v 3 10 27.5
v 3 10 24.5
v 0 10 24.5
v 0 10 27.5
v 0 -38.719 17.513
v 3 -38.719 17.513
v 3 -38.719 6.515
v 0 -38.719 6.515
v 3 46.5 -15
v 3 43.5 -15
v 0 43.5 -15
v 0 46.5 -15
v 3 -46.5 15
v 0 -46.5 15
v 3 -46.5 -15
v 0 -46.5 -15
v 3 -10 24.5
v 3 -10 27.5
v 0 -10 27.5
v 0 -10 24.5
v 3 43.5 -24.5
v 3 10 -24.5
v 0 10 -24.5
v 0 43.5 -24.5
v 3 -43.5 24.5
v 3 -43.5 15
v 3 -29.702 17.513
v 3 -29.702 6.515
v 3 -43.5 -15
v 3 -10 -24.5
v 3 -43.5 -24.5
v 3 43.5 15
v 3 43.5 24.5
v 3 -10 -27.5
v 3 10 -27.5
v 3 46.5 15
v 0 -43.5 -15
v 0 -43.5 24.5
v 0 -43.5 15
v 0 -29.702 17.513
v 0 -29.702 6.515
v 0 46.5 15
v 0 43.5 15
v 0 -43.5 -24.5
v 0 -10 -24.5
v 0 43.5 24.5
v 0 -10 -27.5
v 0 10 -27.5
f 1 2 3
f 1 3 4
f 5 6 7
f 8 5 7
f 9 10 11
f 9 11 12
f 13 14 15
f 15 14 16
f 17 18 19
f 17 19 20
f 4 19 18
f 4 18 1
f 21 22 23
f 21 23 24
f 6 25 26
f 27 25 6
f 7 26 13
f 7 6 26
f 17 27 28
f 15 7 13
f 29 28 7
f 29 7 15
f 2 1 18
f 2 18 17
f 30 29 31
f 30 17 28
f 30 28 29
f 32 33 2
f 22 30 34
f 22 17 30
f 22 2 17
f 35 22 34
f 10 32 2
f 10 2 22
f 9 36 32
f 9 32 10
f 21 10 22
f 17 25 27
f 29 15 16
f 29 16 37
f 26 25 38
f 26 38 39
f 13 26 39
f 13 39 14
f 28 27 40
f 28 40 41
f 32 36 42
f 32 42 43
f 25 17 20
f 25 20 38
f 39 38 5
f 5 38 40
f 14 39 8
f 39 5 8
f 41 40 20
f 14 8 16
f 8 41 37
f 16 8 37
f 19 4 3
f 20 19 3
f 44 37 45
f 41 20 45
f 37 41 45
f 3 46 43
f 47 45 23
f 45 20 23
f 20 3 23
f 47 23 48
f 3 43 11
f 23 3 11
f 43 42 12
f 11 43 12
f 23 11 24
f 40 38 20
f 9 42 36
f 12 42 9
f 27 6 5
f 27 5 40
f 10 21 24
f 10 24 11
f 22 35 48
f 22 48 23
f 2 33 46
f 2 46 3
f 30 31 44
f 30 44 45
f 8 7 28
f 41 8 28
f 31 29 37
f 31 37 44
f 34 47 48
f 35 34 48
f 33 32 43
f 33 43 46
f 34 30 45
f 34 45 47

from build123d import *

# Parameters (mm, degrees)
SKETCH2_W           = 55
SKETCH2_H           = 93
BOSS_EXTRUDE1_DEPTH = 3
SKETCH3_W           = 10.997747865
SKETCH3_H           = 9.016820523
CUT_EXTRUDE1_DEPTH  = 3


with BuildPart() as part:
    # Sketch2 → Boss-Extrude1 (new body)
    with BuildSketch(Plane(origin=(0, 0, 0), x_dir=(0, 0, -1), z_dir=(1, 0, 0))):
        Rectangle(SKETCH2_W, SKETCH2_H)
    extrude(amount=BOSS_EXTRUDE1_DEPTH)

    # Sketch3 → Cut-Extrude1 (cut)
    with BuildSketch(Plane(origin=(3, 0, 0), x_dir=(0, 0, -1), z_dir=(1, 0, 0))):
        Polygon((-27.5, 46.5), (-24.5, 46.5), (-15, 46.5), (-15, 43.5), (-24.5, 43.5), (-24.5, 10), (-27.5, 10), align=None)
        Polygon((27.5, 46.5), (27.5, 10), (24.5, 10), (24.5, 43.5), (15, 43.5), (15, 46.5), (24.5, 46.5), align=None)
        Polygon((27.5, -46.5), (24.5, -46.5), (15, -46.5), (15, -43.5), (24.5, -43.5), (24.5, -10), (27.5, -10), align=None)
        Polygon((-27.5, -46.5), (-27.5, -10), (-24.5, -10), (-24.5, -43.5), (-15, -43.5), (-15, -46.5), (-24.5, -46.5), align=None)
        with Locations((-12.014032646, -34.210673658)):
            Rectangle(SKETCH3_W, SKETCH3_H)
    extrude(amount=-CUT_EXTRUDE1_DEPTH, mode=Mode.SUBTRACT)


solid = part.part
